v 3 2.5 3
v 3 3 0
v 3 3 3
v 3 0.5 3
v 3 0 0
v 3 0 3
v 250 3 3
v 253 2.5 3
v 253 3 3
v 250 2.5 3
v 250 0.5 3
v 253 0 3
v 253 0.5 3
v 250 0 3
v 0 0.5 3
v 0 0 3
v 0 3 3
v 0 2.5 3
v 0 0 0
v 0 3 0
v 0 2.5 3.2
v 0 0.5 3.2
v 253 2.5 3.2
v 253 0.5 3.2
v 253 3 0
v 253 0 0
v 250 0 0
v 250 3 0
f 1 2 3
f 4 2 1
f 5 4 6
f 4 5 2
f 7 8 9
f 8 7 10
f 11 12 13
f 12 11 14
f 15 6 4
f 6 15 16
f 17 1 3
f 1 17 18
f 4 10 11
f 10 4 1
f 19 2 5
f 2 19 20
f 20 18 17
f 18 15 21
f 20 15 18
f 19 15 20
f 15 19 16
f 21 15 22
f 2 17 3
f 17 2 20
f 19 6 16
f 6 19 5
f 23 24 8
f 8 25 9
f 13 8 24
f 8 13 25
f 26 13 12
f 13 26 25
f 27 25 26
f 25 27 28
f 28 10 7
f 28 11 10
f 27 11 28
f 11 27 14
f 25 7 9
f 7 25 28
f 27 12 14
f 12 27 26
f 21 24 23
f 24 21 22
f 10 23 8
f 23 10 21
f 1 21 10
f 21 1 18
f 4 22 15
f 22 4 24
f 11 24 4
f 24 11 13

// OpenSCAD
cube([3,3,3]);
translate([250,0,0])cube([3,3,3]);
translate([0,.5,3])cube([253,2,.2]);
